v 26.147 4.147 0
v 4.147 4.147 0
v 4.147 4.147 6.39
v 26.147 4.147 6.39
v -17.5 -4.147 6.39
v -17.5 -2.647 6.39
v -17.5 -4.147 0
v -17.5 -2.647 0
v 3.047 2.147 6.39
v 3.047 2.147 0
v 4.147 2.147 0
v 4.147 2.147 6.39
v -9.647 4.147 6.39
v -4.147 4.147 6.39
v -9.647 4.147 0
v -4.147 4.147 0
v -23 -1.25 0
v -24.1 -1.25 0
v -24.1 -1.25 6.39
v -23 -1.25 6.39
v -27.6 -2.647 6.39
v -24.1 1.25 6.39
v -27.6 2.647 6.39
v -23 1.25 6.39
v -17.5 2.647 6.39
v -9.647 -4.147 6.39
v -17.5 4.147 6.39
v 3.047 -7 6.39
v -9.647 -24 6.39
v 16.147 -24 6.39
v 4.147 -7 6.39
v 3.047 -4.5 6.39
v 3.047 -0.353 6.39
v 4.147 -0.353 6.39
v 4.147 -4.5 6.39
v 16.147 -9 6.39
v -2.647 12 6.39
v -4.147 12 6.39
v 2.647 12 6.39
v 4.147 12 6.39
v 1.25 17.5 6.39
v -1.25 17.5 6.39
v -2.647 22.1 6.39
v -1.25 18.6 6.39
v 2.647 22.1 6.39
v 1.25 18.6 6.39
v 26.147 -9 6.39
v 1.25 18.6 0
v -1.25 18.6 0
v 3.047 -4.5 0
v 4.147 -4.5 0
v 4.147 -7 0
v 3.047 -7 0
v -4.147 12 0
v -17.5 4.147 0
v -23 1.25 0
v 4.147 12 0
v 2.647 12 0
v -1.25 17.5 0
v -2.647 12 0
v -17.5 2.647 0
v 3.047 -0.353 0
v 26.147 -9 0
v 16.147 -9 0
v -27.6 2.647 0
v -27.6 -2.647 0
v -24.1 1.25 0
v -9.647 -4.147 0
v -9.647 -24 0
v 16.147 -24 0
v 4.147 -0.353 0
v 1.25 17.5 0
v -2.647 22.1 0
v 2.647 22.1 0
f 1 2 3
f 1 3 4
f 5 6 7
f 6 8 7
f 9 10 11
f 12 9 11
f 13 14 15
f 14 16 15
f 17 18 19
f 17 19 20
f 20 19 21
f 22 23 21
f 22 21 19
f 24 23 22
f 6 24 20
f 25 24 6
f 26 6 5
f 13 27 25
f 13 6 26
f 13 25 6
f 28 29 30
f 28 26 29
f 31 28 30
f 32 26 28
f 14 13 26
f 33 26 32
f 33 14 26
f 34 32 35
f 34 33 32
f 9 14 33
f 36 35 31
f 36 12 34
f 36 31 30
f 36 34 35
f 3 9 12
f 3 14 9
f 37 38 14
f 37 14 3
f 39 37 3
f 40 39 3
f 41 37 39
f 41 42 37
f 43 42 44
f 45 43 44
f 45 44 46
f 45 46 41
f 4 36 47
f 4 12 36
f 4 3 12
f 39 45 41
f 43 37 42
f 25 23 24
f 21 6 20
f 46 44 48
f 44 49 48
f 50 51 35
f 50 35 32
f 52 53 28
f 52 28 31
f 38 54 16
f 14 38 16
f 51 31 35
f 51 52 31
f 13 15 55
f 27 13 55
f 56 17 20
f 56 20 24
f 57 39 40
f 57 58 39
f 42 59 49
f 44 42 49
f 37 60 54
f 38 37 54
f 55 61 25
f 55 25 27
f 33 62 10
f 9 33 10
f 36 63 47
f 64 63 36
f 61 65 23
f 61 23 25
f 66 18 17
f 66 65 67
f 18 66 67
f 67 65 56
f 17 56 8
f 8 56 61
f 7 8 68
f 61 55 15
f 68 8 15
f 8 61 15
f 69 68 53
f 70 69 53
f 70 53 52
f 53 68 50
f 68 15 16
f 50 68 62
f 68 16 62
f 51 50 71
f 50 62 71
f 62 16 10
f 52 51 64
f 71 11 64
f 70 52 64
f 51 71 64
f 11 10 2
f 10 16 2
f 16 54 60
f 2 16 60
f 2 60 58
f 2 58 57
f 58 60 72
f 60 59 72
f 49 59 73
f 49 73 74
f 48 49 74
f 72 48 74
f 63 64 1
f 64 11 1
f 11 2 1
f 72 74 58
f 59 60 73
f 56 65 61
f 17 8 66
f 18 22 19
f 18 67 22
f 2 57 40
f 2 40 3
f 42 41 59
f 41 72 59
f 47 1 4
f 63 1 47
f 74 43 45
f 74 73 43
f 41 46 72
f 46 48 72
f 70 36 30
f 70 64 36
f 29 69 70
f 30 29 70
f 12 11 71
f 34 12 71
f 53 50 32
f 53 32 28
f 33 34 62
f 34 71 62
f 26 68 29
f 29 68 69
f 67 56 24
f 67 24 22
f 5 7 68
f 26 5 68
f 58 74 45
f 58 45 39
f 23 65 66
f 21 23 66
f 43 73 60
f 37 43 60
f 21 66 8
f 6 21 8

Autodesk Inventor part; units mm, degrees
ref_plane "YZ Plane" through (0, 0, 0) normal (1, 0, 0) x (0, 1, 0)
ref_plane "XZ Plane" through (0, 0, 0) normal (0, 1, 0) x (-1, 0, 0)
ref_plane "XY Plane" through (0, 0, 0) normal (0, 0, 1) x (1, 0, 0)
sketch "Sketch1" plane through (0, 0, 0) normal (0, 0, 1) x (1, 0, 0)
  line L0 (-2.6473, 22.1) -> (2.6473, 22.1)
  line L1 (2.6473, 22.1) -> (2.6473, 12)
  line L2 (2.6473, 12) -> (4.1473, 12)
  line L3 (4.1473, 12) -> (4.1473, 4.1473)
  line L4 (0, 22.1) -> (0, 0) construction
  line L5 (-2.6473, 22.1) -> (-2.6473, 12)
  line L6 (-2.6473, 12) -> (-4.1473, 12)
  line L7 (-1.25, 18.6) -> (1.25, 18.6)
  line L8 (1.25, 18.6) -> (1.25, 17.5)
  line L9 (1.25, 17.5) -> (-1.25, 17.5)
  line L10 (-1.25, 17.5) -> (-1.25, 18.6)
  line L11 (-9.6473, -24) -> (16.1473, -24)
  line L12 (26.1473, -9) -> (16.1473, -9)
  line L13 (16.1473, -9) -> (16.1473, -24)
  line L14 (3.0473, 2.1473) -> (4.1473, 2.1473)
  line L15 (4.1473, 2.1473) -> (4.1473, -0.3527)
  line L16 (4.1473, -0.3527) -> (3.0473, -0.3527)
  line L17 (3.0473, -0.3527) -> (3.0473, 2.1473)
  line L18 (-4.1473, 12) -> (-30.8527, 12) construction
  line L19 (-27.6, 2.6473) -> (-27.6, -2.6473)
  line L20 (-27.6, -2.6473) -> (-17.5, -2.6473)
  line L21 (-17.5, -2.6473) -> (-17.5, -4.1473)
  line L22 (-17.5, -4.1473) -> (-9.6473, -4.1473)
  line L23 (-9.6473, -4.1473) -> (-9.6473, -24)
  line L24 (-27.6, 2.6473) -> (-17.5, 2.6473)
  line L25 (-17.5, 2.6473) -> (-17.5, 4.1473)
  line L26 (-24.1, 1.25) -> (-24.1, -1.25)
  line L27 (-24.1, -1.25) -> (-23, -1.25)
  line L28 (-23, -1.25) -> (-23, 1.25)
  line L29 (-23, 1.25) -> (-24.1, 1.25)
  line L30 (-17.5, 12) -> (-17.5, -24) construction
  line L31 (-4.1473, 12) -> (-4.1473, 4.1473)
  line L32 (-9.6473, 4.1473) -> (-17.5, 4.1473)
  line L33 (-4.1473, 4.1473) -> (-9.6473, 4.1473)
  line L34 (26.1473, 4.1473) -> (26.1473, -9)
  line L35 (26.1473, -2.4263) -> (4.1473, -2.4263) construction
  line L36 (3.0473, -7) -> (4.1473, -7)
  line L37 (4.1473, -7) -> (4.1473, -4.5)
  line L38 (4.1473, -4.5) -> (3.0473, -4.5)
  line L39 (3.0473, -4.5) -> (3.0473, -7)
  line L40 (4.1473, 4.1473) -> (26.1473, 4.1473)
  point P0 (0, 17.5)
  point P1 (3.0473, 0.8973)
  point P2 (4.1473, 0.8973)
  point P3 (-24.1, 0)
  point P4 (-27.6, 0)
  dimension "d4" = 1.5
  dimension "d26" = 10.1
  dimension "d27" = 5.2946
  dimension "d31" = 2.5
  dimension "d32" = 1.1
  dimension "d35" = 5.5
  dimension "d41" = 1.1
  dimension "d42" = 2.5
  dimension "d72" = 17.5
  dimension "BearingHolderHeight" = 24.5263
  dimension "d99" = 5.5
  dimension "d103" = 12
  dimension "d104" = 10
  dimension "d105" = 13.1473
  dimension "d106" = 2
  dimension "d108" = 15
  dimension "d124" = 12
  dimension "d125" = 7.8527
extrude "Extrusion2" add sketch "Sketch1" along normal blind 6.39
equation "\"BearingDiameter\" = 24"
equation "\"WoodThickness\" = 6.39"
equation "\"BearingWidth\" = 7"
equation "\"BearingShaftDiameter\" = 8"
equation "\"ZipTieWidth\" = 2.5"
equation "\"ZipTieThickness\" = 1.1"
equation "\"ZipTieClearance\" = 1"
equation "\"ZipTieDistance\" = 10"
equation "\"BearingSiliconeWidth\" = 14"
properties part number "BearingStand_V2" material "Wood (Birch)"
